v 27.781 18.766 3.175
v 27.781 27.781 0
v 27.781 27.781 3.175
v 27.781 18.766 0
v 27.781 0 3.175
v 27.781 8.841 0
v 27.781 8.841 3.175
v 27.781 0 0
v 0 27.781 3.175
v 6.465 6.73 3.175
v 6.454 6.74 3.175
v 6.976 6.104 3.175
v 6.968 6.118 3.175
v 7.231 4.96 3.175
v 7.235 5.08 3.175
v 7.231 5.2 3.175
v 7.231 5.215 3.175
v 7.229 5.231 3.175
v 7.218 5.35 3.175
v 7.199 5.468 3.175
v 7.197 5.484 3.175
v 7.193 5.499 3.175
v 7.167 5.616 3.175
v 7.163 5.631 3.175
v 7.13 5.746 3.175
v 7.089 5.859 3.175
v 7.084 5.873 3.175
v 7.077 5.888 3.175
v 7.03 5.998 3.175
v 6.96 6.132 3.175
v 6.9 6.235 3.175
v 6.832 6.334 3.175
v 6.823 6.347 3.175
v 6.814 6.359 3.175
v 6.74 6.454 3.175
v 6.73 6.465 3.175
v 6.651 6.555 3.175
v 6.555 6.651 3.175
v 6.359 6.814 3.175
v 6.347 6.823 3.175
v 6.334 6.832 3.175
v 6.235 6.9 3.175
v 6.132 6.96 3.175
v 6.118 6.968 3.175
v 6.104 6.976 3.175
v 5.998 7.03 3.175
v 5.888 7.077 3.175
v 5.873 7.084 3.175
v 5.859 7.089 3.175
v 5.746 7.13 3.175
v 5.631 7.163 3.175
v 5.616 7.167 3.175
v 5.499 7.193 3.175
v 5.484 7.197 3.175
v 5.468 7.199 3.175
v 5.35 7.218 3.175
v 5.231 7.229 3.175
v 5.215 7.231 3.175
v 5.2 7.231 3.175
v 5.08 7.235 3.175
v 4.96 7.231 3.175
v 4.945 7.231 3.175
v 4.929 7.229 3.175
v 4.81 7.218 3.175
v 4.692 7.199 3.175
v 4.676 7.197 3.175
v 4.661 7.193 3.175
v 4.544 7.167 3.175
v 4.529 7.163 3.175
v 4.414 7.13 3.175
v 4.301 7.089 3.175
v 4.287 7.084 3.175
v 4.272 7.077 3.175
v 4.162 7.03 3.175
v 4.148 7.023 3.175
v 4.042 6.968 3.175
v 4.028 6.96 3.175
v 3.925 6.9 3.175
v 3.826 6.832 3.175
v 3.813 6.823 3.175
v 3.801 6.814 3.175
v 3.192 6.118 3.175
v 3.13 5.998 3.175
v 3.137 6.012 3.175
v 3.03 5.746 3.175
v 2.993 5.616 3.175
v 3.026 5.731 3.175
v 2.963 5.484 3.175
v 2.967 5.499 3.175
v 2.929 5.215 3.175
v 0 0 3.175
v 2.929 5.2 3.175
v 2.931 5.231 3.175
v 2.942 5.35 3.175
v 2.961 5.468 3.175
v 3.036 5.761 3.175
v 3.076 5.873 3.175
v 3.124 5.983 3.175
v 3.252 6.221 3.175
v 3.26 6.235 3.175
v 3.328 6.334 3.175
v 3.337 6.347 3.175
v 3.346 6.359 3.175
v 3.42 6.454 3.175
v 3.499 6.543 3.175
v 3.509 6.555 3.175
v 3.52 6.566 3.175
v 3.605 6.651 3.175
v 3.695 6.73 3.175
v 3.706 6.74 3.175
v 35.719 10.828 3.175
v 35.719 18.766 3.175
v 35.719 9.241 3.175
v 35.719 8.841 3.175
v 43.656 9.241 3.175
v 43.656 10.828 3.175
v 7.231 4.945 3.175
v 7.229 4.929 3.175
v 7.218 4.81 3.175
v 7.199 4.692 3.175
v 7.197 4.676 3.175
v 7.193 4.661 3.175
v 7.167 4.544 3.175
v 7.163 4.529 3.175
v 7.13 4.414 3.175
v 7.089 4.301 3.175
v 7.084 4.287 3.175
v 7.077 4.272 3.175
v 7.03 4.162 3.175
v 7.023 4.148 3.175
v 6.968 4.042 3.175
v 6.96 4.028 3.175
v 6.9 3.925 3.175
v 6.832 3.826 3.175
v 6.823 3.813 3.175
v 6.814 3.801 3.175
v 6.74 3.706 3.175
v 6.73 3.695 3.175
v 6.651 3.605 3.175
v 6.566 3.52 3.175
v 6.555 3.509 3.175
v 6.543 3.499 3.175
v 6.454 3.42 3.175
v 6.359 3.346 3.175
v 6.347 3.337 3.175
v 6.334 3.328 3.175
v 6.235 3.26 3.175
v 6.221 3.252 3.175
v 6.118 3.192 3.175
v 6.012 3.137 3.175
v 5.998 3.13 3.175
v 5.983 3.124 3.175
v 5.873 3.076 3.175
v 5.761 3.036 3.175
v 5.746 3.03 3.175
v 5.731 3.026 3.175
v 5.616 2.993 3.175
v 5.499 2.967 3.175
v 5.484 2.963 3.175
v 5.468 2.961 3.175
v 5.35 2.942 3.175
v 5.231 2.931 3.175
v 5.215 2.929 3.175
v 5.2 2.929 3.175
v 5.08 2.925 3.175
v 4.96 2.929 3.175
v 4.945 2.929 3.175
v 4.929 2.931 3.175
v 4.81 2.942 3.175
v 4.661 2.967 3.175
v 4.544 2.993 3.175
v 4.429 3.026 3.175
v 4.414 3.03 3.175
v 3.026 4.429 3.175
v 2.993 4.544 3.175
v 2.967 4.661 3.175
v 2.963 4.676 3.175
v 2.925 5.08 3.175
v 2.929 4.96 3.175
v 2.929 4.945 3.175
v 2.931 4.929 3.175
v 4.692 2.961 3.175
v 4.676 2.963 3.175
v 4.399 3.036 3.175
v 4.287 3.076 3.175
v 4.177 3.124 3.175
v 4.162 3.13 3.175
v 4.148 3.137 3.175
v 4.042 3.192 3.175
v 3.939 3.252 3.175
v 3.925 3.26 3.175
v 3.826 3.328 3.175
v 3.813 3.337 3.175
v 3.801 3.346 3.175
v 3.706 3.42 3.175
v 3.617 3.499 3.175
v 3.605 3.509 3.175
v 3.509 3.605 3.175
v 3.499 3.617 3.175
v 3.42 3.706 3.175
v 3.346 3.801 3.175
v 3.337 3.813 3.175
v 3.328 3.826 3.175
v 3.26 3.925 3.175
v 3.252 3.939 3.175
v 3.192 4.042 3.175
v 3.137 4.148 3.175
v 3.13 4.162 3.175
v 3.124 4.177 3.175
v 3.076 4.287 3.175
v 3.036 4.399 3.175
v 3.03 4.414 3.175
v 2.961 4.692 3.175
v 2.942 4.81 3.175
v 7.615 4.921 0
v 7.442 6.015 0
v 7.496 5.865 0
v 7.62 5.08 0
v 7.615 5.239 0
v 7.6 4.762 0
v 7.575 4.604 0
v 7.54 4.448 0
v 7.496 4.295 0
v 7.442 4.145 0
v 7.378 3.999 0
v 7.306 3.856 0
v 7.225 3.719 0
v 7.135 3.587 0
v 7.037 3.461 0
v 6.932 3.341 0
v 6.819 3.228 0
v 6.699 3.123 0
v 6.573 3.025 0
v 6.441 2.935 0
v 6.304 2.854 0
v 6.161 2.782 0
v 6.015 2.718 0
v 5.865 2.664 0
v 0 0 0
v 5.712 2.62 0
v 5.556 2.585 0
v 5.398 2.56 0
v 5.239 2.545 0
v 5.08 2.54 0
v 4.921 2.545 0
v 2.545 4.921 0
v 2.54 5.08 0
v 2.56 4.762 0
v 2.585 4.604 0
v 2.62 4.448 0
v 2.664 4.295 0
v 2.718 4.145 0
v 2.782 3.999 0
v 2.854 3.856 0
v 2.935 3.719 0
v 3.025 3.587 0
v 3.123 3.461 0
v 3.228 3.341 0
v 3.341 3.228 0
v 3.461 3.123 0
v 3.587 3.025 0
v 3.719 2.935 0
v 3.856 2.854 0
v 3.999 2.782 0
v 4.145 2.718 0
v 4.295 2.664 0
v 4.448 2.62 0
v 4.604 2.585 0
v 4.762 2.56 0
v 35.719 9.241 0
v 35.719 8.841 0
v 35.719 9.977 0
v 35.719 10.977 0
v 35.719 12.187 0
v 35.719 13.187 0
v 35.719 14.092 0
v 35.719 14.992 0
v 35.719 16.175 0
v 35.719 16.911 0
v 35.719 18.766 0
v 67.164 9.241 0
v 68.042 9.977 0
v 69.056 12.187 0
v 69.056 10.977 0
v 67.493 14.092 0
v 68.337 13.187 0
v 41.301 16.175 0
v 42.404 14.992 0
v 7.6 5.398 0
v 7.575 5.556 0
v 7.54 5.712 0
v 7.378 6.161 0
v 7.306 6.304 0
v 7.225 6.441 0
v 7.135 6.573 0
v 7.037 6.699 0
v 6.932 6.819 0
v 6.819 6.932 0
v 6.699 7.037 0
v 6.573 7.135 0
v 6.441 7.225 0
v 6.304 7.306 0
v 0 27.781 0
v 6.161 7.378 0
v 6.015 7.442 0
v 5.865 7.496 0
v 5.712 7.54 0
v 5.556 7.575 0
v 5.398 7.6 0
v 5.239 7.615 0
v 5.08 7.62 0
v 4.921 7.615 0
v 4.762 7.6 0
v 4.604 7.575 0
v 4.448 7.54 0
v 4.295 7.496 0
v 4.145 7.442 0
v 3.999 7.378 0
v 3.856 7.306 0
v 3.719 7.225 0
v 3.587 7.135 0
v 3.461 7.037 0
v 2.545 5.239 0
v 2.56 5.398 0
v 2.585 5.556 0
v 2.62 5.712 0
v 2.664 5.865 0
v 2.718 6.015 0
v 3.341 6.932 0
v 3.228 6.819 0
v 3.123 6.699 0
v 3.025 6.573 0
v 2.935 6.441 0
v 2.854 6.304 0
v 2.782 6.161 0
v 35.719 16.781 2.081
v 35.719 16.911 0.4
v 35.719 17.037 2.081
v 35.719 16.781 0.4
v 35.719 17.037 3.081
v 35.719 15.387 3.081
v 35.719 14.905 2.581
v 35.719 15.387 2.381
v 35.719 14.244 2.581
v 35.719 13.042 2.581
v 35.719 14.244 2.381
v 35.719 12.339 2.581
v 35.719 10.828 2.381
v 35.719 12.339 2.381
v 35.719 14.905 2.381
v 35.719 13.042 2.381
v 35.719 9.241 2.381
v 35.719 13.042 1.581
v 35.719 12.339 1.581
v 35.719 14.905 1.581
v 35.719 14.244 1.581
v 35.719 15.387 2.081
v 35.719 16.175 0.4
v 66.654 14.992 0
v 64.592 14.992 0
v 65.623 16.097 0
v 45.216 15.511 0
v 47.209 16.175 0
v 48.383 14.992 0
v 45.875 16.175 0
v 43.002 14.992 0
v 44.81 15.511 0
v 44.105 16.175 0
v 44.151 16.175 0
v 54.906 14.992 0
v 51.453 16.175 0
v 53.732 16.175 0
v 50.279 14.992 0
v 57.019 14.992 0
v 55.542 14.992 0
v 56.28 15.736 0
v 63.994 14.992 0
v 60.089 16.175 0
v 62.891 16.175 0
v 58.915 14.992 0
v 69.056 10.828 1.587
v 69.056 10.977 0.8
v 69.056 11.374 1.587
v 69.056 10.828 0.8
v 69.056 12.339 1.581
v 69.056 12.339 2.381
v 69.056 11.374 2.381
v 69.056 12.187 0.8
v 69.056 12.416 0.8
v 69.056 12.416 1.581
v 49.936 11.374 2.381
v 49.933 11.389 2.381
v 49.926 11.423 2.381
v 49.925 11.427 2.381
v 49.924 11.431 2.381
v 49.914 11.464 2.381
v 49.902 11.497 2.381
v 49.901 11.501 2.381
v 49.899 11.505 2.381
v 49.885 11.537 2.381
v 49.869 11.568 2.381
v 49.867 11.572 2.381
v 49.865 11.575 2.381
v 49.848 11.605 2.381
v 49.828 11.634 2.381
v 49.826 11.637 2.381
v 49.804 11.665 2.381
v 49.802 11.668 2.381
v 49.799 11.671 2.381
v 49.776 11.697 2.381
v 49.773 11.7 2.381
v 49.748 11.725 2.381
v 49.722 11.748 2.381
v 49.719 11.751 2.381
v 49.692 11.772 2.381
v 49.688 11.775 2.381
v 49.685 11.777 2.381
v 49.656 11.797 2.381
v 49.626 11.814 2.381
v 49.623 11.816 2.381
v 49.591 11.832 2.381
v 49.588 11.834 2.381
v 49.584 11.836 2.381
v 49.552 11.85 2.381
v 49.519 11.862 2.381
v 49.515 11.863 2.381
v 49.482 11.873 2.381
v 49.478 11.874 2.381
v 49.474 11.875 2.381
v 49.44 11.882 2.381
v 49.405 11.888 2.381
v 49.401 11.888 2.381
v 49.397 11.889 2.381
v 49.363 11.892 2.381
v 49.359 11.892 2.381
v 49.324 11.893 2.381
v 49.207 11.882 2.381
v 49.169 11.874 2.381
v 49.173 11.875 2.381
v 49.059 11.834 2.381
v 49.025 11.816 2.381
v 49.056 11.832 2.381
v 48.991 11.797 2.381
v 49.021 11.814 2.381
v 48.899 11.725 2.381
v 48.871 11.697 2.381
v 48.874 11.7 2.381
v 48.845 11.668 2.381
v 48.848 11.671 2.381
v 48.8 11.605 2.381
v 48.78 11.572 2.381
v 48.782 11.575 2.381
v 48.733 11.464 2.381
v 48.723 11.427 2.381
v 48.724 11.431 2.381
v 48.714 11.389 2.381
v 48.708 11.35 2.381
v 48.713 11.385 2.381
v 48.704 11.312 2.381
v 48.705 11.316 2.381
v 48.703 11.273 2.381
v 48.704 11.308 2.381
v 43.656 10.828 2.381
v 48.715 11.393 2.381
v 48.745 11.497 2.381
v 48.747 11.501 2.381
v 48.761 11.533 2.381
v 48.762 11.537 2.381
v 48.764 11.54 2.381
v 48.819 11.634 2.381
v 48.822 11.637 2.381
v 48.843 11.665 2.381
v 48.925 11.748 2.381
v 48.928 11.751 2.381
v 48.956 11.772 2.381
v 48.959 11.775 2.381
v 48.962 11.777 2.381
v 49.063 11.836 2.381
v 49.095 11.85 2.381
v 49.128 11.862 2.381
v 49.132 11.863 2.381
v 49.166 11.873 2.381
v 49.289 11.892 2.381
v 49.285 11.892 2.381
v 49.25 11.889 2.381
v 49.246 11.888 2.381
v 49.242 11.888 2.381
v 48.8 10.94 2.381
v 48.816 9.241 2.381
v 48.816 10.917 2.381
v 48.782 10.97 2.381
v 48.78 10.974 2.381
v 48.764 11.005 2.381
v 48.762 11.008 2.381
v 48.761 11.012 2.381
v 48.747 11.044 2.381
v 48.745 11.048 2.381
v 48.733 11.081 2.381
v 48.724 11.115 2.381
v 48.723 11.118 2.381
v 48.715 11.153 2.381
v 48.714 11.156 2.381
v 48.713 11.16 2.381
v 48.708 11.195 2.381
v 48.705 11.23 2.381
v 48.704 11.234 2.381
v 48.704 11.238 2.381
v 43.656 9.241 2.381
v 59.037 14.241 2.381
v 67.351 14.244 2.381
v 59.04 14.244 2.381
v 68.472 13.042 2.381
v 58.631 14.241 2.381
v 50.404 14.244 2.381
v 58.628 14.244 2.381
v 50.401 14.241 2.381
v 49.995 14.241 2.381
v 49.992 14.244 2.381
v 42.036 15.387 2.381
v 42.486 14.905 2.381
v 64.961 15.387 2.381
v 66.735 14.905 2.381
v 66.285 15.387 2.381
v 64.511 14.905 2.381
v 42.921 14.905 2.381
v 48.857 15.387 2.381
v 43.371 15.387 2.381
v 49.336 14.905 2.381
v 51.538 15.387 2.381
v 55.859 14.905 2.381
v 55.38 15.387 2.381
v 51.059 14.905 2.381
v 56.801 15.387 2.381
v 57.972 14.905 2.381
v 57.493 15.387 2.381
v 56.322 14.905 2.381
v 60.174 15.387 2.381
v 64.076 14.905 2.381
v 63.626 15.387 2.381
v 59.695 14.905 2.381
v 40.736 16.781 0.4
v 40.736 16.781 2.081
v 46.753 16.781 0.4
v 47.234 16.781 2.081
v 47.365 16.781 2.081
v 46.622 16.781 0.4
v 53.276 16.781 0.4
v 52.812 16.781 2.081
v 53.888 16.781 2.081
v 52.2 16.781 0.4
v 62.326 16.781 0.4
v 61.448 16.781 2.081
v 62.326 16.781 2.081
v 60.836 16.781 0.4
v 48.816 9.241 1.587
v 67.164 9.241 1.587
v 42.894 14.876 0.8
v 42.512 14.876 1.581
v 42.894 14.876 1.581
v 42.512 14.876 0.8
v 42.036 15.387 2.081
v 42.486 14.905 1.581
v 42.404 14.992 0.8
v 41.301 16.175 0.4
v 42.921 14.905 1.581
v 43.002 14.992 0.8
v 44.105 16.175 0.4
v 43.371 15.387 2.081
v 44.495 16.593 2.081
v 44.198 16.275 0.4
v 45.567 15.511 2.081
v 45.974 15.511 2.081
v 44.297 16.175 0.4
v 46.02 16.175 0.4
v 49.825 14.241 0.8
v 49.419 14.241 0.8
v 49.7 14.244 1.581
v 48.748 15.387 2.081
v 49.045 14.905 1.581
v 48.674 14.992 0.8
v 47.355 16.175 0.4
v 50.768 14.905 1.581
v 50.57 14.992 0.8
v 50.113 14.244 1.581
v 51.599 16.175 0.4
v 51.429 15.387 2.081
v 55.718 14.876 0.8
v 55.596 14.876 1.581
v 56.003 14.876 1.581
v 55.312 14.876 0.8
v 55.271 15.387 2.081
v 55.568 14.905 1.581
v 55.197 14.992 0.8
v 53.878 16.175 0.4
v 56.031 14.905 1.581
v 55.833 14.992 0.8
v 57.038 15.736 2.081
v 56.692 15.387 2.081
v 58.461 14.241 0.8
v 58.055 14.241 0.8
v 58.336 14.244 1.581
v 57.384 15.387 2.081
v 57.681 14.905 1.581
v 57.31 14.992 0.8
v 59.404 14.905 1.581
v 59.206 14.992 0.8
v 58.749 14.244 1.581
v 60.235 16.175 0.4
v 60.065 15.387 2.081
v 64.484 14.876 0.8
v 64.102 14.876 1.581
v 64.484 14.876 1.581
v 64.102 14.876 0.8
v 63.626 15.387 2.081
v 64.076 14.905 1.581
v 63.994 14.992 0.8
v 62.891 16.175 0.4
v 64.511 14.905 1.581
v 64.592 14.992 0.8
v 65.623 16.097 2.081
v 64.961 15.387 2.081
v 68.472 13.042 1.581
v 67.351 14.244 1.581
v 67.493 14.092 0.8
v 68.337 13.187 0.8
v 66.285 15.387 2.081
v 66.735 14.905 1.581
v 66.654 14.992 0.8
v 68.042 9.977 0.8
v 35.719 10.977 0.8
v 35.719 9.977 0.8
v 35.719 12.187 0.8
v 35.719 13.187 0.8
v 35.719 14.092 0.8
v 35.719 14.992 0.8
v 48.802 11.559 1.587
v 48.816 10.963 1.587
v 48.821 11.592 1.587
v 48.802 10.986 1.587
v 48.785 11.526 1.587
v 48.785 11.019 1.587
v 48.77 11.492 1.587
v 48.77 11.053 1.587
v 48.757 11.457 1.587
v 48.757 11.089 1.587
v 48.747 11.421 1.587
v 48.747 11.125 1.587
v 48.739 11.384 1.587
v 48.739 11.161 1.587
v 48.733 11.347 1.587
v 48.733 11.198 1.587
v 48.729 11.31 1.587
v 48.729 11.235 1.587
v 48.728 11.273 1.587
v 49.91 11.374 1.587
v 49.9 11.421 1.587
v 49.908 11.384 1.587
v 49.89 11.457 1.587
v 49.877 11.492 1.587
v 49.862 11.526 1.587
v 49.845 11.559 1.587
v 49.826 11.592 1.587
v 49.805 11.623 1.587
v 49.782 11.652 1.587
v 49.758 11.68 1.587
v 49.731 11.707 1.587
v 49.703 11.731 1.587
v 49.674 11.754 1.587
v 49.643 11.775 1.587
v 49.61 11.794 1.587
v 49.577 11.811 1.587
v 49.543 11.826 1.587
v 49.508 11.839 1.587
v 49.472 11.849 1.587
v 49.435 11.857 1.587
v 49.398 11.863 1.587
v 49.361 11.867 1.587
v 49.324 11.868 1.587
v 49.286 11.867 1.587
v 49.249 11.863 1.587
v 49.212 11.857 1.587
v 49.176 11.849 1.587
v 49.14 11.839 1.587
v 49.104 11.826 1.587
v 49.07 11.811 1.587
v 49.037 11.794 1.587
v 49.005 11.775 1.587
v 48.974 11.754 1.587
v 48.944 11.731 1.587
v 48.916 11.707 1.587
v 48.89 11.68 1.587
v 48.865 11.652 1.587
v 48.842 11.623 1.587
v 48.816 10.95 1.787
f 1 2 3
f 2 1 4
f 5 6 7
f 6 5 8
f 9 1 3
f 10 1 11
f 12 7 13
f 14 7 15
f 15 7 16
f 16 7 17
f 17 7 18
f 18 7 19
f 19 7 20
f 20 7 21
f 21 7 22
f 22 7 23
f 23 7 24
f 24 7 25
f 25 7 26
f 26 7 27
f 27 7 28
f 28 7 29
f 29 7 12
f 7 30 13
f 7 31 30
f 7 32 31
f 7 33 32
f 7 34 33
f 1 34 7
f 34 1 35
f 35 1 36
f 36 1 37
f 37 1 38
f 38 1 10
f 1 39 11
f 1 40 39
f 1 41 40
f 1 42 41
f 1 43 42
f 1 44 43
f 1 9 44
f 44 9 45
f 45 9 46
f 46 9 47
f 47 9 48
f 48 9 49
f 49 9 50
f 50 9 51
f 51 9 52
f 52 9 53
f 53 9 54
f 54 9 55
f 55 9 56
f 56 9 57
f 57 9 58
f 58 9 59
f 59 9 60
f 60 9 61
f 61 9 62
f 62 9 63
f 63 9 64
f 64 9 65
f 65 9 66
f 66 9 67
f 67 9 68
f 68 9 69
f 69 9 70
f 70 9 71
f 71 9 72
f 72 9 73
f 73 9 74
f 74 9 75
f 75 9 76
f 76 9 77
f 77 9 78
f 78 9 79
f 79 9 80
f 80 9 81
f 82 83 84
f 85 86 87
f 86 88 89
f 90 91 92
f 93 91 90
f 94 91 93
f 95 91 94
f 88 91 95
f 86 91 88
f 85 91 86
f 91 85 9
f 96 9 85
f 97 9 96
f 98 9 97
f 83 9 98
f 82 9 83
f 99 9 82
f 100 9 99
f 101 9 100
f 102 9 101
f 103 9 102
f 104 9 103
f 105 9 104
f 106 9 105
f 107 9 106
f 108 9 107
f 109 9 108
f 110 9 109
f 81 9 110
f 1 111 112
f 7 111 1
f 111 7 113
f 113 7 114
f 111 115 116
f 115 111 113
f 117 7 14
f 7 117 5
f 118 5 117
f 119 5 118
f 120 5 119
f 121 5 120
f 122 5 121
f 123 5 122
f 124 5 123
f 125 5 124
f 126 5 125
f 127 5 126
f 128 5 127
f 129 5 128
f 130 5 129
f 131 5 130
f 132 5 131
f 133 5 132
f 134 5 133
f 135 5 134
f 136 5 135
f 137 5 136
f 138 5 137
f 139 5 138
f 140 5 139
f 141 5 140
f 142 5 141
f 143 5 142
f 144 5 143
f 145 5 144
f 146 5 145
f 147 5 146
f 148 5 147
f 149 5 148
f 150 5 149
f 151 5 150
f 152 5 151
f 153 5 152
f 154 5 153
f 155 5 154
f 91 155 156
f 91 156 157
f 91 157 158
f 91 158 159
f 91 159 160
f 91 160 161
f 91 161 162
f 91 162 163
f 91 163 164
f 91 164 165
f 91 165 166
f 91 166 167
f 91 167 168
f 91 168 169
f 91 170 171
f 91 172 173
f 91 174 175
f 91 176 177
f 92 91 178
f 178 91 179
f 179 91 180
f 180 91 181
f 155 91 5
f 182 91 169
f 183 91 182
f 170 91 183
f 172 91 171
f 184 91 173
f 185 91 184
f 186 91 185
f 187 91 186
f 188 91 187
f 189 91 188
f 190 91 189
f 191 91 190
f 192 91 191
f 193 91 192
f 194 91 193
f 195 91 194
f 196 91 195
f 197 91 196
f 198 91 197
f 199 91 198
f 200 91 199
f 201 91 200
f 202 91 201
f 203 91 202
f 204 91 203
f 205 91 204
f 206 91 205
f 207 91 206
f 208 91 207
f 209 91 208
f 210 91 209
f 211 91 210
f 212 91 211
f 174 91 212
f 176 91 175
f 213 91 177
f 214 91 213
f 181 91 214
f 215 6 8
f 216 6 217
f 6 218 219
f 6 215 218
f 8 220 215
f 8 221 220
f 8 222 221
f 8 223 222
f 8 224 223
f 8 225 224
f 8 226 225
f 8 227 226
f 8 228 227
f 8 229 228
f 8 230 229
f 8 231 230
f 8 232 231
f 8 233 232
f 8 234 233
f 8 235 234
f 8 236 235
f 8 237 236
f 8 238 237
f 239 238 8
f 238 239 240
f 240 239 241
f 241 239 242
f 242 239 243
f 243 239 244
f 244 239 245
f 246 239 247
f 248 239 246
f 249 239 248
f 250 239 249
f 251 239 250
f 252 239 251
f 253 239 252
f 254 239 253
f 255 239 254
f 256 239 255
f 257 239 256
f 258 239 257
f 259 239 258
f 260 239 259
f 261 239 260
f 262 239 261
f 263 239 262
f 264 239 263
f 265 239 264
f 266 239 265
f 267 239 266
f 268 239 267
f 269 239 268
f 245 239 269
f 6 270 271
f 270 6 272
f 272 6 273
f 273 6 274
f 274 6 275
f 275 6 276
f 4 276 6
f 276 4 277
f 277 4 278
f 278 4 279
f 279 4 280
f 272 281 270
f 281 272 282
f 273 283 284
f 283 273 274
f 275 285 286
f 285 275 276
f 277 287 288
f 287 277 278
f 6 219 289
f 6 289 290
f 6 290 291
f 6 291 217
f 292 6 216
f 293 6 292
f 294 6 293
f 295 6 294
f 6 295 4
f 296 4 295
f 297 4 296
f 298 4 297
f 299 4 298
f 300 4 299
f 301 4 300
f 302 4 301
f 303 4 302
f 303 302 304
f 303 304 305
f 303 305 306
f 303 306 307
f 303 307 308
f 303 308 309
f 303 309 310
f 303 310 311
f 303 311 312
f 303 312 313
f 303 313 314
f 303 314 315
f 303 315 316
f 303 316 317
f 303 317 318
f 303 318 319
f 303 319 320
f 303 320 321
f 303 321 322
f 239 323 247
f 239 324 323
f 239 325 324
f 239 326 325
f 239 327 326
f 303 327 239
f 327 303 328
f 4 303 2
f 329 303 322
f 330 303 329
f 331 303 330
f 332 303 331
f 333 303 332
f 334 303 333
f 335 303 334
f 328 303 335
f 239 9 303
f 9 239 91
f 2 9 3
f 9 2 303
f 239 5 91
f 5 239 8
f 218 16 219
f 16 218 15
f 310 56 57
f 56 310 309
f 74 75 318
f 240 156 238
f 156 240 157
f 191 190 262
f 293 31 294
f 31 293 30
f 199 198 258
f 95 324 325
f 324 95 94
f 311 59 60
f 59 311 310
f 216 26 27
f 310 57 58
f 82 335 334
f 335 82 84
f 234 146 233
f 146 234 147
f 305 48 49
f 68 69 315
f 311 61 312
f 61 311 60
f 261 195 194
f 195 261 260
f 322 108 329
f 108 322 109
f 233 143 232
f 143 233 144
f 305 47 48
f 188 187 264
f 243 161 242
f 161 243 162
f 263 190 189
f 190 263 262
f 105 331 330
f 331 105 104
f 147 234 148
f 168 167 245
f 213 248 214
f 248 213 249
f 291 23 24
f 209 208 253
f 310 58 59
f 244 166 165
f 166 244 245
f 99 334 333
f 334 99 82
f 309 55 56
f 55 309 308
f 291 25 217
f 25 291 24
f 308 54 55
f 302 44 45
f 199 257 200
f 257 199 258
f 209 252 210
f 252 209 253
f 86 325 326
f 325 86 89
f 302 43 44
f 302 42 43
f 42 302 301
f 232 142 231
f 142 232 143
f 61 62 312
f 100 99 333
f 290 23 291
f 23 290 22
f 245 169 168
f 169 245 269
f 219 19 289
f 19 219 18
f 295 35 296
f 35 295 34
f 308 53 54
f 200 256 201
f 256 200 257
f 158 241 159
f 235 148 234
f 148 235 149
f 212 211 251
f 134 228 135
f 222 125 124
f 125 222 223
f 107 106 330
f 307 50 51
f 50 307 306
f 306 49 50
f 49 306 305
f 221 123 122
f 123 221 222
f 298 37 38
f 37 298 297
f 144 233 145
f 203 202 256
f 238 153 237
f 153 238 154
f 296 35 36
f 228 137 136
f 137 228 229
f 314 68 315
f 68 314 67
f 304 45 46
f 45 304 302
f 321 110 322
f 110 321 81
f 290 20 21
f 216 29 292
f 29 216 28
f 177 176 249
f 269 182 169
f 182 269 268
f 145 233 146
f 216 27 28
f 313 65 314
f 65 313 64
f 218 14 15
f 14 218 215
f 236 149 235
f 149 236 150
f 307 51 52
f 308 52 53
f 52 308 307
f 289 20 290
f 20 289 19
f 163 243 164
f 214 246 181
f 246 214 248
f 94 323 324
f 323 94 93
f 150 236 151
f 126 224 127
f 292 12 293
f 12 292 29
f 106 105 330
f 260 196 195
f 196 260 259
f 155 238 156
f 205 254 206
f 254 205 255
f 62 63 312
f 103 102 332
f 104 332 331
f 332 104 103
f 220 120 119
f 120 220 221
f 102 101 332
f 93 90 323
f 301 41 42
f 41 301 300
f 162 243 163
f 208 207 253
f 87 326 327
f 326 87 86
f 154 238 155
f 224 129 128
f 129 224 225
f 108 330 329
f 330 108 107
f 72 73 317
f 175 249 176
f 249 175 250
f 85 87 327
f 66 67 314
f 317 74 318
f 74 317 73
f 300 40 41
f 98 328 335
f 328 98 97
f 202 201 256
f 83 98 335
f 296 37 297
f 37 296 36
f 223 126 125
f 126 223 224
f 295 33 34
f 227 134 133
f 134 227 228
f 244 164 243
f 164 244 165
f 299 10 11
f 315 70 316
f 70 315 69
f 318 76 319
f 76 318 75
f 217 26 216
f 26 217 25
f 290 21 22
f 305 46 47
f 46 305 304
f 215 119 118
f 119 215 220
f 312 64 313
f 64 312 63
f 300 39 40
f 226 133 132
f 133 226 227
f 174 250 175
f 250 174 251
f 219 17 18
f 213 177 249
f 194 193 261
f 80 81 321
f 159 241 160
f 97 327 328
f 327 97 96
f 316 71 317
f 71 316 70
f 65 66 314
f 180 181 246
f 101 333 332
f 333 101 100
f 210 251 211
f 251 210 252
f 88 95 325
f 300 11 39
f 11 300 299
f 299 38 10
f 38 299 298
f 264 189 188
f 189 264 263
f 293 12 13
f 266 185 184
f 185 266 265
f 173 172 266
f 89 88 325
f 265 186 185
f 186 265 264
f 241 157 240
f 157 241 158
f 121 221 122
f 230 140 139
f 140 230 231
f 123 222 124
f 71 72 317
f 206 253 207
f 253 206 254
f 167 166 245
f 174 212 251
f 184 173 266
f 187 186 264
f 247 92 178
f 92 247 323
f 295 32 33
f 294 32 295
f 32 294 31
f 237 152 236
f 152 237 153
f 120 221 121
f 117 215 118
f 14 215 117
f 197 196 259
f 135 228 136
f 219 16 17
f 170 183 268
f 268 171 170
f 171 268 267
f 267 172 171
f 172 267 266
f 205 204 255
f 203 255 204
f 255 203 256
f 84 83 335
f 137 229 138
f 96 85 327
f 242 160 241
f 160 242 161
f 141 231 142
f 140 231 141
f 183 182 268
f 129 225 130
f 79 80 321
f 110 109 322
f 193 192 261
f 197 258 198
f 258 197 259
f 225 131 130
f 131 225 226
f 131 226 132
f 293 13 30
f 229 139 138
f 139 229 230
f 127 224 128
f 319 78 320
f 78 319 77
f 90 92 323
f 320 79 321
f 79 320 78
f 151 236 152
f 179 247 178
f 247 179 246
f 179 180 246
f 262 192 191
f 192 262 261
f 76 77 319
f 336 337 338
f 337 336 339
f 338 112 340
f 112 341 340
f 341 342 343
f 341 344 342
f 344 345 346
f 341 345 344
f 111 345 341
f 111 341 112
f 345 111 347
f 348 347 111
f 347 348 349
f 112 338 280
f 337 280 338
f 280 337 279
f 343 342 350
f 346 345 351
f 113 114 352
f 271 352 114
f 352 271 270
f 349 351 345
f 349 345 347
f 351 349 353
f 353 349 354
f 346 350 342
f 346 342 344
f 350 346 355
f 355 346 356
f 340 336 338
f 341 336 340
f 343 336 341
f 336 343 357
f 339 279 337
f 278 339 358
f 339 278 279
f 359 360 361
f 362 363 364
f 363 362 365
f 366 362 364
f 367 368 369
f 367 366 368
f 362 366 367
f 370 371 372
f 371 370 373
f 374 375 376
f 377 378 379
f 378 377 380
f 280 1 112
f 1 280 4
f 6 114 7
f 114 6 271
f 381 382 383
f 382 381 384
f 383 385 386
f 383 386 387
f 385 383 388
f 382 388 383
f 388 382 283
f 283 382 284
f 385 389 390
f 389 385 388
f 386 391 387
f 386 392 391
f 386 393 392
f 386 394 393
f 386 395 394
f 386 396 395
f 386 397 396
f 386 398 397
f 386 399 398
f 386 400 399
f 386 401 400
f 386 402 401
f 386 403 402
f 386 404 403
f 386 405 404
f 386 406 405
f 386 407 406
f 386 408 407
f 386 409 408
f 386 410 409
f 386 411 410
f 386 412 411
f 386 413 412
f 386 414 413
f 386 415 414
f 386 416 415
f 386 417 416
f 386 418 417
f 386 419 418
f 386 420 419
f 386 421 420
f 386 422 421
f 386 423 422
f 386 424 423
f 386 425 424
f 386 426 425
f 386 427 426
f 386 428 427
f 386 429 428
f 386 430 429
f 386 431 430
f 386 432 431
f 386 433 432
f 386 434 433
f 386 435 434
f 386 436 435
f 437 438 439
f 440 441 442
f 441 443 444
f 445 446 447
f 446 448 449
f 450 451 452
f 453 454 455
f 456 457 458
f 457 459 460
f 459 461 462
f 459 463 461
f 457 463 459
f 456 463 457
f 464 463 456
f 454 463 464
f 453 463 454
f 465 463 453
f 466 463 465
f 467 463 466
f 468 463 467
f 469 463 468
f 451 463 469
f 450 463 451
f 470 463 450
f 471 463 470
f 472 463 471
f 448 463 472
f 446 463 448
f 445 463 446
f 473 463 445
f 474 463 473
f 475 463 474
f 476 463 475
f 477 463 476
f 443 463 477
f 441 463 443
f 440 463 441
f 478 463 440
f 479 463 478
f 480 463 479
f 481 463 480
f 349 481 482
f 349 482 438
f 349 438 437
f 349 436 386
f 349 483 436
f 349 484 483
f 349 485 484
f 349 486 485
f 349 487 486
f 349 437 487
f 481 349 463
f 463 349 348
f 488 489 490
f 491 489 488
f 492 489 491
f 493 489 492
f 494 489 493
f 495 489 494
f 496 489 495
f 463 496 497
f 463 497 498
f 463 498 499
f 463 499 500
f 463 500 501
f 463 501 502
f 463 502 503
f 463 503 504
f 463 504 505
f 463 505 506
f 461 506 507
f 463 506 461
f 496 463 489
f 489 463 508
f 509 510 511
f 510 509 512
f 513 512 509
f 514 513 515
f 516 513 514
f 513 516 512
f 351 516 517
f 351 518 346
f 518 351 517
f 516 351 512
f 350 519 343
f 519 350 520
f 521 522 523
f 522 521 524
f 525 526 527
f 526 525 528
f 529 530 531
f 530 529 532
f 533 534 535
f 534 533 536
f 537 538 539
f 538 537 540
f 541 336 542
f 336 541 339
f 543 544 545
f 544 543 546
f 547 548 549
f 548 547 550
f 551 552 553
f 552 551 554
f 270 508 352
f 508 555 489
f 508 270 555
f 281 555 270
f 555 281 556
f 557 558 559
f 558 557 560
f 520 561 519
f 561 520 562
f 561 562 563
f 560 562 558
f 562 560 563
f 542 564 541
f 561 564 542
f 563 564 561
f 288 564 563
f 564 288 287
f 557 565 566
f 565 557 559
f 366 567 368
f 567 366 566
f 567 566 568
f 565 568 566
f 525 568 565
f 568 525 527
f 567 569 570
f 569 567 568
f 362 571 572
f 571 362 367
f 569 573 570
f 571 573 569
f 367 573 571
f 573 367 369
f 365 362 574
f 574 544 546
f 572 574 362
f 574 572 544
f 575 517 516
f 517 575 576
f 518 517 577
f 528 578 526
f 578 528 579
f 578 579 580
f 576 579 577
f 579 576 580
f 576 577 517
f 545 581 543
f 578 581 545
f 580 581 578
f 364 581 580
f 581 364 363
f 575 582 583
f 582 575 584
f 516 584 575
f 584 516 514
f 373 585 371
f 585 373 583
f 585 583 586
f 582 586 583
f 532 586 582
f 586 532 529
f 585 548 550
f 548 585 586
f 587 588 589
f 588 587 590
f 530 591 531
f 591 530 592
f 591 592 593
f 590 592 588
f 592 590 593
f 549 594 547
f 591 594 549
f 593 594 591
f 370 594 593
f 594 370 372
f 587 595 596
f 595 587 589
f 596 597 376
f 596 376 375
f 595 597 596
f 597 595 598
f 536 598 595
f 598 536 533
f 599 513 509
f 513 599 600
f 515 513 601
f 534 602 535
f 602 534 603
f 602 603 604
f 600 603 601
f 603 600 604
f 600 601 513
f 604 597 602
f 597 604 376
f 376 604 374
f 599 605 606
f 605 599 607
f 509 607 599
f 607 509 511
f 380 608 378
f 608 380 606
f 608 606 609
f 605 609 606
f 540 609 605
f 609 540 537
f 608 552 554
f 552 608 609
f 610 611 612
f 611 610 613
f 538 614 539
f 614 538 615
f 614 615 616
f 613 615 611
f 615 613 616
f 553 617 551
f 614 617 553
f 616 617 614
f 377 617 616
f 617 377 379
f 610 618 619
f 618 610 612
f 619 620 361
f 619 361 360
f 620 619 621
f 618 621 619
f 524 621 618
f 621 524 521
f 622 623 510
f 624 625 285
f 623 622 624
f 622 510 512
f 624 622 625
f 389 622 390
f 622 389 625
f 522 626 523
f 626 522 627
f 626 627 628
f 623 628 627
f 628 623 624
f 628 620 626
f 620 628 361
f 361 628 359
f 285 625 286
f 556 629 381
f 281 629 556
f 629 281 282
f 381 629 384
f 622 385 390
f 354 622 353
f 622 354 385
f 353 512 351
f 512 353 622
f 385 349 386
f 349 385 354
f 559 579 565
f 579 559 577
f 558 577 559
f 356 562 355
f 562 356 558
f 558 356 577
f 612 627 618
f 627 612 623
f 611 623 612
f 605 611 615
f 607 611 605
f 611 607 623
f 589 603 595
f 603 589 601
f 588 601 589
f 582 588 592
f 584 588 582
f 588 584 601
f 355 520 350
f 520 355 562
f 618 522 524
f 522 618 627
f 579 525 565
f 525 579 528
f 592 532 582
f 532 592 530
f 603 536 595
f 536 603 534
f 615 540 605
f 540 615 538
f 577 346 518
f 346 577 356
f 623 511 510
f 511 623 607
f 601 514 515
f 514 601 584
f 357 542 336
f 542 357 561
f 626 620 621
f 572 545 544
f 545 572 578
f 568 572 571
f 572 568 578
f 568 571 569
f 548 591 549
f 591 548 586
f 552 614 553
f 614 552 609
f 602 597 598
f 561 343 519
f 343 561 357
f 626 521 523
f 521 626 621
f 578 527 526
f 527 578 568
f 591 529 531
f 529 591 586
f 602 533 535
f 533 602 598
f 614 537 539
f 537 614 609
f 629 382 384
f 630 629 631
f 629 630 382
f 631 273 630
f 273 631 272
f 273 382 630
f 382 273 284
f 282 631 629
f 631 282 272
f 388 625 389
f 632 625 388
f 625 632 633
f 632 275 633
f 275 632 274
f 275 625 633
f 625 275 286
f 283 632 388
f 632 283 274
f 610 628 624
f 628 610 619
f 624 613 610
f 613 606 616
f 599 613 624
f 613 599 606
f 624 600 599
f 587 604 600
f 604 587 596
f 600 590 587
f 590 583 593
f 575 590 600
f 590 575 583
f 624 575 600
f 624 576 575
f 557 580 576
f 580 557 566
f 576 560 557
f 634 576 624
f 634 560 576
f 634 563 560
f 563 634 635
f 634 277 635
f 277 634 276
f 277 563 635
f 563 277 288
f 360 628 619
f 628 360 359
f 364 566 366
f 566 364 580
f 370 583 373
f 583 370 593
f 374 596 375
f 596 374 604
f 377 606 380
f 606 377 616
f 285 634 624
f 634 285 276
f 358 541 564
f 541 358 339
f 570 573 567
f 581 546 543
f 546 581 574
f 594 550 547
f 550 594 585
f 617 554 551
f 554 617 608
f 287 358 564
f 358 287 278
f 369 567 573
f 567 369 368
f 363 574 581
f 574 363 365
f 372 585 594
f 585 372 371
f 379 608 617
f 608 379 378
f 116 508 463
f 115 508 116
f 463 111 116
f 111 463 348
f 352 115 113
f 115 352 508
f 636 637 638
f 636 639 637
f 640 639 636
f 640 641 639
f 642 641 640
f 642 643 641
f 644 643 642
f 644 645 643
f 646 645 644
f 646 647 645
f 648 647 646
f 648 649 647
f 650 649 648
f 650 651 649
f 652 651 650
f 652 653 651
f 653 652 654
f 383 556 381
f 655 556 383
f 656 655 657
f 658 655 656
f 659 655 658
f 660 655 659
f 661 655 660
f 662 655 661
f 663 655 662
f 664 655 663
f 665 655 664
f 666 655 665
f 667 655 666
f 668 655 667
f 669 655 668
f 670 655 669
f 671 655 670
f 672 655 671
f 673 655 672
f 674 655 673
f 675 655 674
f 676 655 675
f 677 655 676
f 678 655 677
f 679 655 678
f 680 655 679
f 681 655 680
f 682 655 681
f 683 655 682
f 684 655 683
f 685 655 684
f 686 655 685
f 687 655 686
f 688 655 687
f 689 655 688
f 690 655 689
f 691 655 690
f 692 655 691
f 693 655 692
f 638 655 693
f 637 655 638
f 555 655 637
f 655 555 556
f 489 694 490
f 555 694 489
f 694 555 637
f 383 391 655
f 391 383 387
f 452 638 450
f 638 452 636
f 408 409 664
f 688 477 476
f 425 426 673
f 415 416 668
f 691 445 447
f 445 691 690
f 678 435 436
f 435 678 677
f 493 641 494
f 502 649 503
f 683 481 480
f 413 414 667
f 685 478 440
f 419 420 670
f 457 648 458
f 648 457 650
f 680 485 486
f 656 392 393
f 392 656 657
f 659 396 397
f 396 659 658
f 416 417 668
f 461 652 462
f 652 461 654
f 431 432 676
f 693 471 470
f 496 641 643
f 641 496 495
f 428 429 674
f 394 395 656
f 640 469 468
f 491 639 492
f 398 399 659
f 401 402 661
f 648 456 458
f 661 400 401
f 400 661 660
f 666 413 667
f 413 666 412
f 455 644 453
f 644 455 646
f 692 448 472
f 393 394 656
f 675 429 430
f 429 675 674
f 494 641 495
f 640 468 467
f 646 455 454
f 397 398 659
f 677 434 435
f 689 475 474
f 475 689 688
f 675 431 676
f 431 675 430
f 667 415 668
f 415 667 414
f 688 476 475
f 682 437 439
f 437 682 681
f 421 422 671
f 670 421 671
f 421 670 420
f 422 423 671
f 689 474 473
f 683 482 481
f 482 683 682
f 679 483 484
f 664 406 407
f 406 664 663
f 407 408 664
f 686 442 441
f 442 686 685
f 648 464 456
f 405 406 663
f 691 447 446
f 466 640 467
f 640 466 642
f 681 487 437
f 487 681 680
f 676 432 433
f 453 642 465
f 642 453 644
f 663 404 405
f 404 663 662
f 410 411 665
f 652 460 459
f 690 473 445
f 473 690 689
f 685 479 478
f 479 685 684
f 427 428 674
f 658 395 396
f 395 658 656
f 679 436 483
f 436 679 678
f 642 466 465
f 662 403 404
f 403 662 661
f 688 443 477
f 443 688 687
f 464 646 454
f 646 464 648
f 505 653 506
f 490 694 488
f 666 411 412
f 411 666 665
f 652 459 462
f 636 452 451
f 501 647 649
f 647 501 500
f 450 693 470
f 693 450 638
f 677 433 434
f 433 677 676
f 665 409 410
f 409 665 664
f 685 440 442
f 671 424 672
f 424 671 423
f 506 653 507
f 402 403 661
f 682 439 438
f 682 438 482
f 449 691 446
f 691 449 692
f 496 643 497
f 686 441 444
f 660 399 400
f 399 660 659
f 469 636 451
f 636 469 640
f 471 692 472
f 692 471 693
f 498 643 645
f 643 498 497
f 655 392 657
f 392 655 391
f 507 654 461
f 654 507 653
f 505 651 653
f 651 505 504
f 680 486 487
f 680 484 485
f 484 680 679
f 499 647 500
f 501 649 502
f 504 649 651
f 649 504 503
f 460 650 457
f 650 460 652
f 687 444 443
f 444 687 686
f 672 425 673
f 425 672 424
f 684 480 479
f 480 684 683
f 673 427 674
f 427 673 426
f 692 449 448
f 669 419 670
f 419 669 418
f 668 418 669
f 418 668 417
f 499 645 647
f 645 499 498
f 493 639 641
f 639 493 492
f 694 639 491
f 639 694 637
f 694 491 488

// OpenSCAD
$fn=100;

// This converts inches to millimeters
function mm(i) = i*25.4;

// The handle of the key. Doesn't do much aside from help turn the key.
module bow(bow_length, bow_width, bow_thickness)
{
	// Creates the hole in the "box"
	difference() {
		// Creates the big "box"
		cube([bow_length, bow_width, bow_thickness]);
		// Cuts out the round hole in it
		translate([mm(0.2), mm(0.2), 0]) cylinder(mm(.5), mm(.1));
  }
}

// A single bit ( I think )
module bit()
{
	w = mm(.15);
	difference()
	{
		translate([-(mm(1/4))/2, 0, -(mm(1/4))/2]) cube([mm(1/4), mm(1), 2*w]);
		translate([-mm(4/512)+0.007, 0, -w]) rotate([0, 0, 133]) cube([w*2, w*2, 3*w]);
		translate([mm(4/512)-0.008, 0, -w]) rotate([0, 0, -43]) cube([w, w*2, 3*w]);
	}
}

// Calculates most things for the blade
module blade(blade_length, blade_width, blade_thickness, key_cuts, key_cut_angle, key_cut_spacing, shoulder, cut_spacing, cut_depth)
{
	// The first item in this is the starting block. All subsequent items get subtracted from the first one.
	difference()
	{
		// Makes the blade, basically a squared off rectangle at this point.
		// Also has the groove for the (slider?).
		union() {
			translate([0, -0.4, 0]) cube([shoulder, mm(3/8) +0.4 , mm(.125)]);
			cube([blade_length + shoulder, blade_width, blade_thickness]);
		}
		
		// This cuts out part of the blade's tip top part to make it slanted.
		translate([blade_length + shoulder, mm(1/8), 0]) { rotate([0, 0, 43]) cube([10, 10, blade_thickness]); }
		// This cuts out part of the blade's tip bottom part to make it slanted.
		translate([blade_length + shoulder, mm(1/16), 0]) { rotate([0, 0, 220]) cube([10, 10, blade_thickness]); }
		
		//Side mill
		// - The eagle side
        // These control how deep the grooves go.
        // "Tip: The end of the key opposite of the bow. Some locks use the tip of the key to align cuts instead of the shoulder." http://www.lockwiki.com/index.php/Key
		tip = 0.8;
		tip2 = 0.3;
		tip3 = 0.4;
		
		// (left side is relative from looking at the key from the perspective of the lock)
		// These three cut out grooves on the side of the key on the left side
		translate([shoulder, 3.0988 , blade_thickness - tip]) cube([blade_length + 0.2, 0.7022, 1]);
		translate([shoulder, 5.0038 , blade_thickness - tip]) cube([blade_length + 0.2, 0.6604, 1]);
		// This one is for the top part.
		translate([shoulder, 6.1468 , blade_thickness - tip2]) cube([blade_length + 0.2, 1.65, 1]);
		
		
		// - The Non-eagle side
		// (right side is relative from looking at the key from the perspective of the lock)
		// These ones are for right side of the key.
		translate([shoulder, 0.7366, tip - 1]) cube([blade_length + 0.2, 1 , 1]);
		translate([shoulder, 2.9464, tip - 1]) cube([blade_length + 0.2, 1 , 1]);
		translate([shoulder, 4.8514, tip - 1]) cube([blade_length + 0.2, 0.9, 1]);
		translate([shoulder, 6.9342, tip3 - 1]) cube([blade_length + 0.2, 0.7366, 1]);

		// Cuts the bits in the blade. Also does the biaxial rotation.
		for (counter = [0:5])
		{
			translate([ shoulder + mm(0.244) + cut_spacing*counter + key_cut_spacing[counter] * mm(0.031), blade_width - (key_cuts[counter]) * cut_depth + 0.000125, blade_thickness/2])
            rotate ([0, key_cut_angle[counter] * 20, 0])
            bit();
		}
	}
}


module biaxial(key_cuts, key_cut_angle, key_cut_spacing)
{   
	blade_length = mm(1.3125);
	blade_width = mm(0.296875);
	blade_thickness = mm(0.09375);

	// The shoulder is the part of the key that connects to the bow of the blade.
	shoulder = mm(0.3125);
	cut_spacing = mm(.17);
	cut_depth = mm(.025);

	bow_length = mm(1.09375);
	bow_width = mm(1.09375);
	bow_thickness = mm(.125);
	
	//from origin to the bottom of the blade
	blade_starting = 11;
	
	//first difference on eagle side
	dip = 2.1336;

	difference()
	{
		union()
		{
			// Draw the bow
			bow(bow_length, bow_width, bow_thickness);
			translate([bow_length, bow_width - blade_width - blade_starting, 0])
			
			// Draw the blade
			blade(blade_length, blade_width, blade_thickness, key_cuts, key_cut_angle, key_cut_spacing, shoulder, cut_spacing, cut_depth);
			translate([mm(1.09375 + 0.3125), bow_width - blade_width - blade_starting, mm(0.09375)]) cube([mm(0.3125), mm(0.0625), mm(0.03125)]);
		}

		translate([mm(1.921875), bow_width - blade_width - blade_starting - 0.5 ,mm(0.0625)]) cube([mm(0.796875) + 0.5, dip + 0.5, mm(0.3125) + 0.5]);
		translate([mm(1.921875) +mm(0.02) , bow_width - blade_width - 11 + mm(0.08)  , mm(0.0625)]) cylinder(mm(0.5), mm(0.0234375));
	}
}

// See this page to understand all of the lingo about fore / aft
// http://www.lockwiki.com/index.php/Medeco_Biaxial

//Angles:
//     -1 = -20
//      0 = 0
//      1 = 20


//Cut spacing:
//      aft = -1
//      center = 0
//      fore = 1


// Current pin
// These are ordered by cuts closest to the bow first.
//           Key Cuts          Key Cut Angle       Key Cut Spacing
biaxial([3, 2, 4, 3, 4, 3], [0, 1, 1, 1, 1, 0], [1, -1, -1, 1, -1, 1]);



// The original function call that came with this scad model:
// biaxial([3, 2, 4, 3, 4, 3], [0, 1, 1, 1, 1, 0], [1, -1, -1, 1, -1, 1]);
